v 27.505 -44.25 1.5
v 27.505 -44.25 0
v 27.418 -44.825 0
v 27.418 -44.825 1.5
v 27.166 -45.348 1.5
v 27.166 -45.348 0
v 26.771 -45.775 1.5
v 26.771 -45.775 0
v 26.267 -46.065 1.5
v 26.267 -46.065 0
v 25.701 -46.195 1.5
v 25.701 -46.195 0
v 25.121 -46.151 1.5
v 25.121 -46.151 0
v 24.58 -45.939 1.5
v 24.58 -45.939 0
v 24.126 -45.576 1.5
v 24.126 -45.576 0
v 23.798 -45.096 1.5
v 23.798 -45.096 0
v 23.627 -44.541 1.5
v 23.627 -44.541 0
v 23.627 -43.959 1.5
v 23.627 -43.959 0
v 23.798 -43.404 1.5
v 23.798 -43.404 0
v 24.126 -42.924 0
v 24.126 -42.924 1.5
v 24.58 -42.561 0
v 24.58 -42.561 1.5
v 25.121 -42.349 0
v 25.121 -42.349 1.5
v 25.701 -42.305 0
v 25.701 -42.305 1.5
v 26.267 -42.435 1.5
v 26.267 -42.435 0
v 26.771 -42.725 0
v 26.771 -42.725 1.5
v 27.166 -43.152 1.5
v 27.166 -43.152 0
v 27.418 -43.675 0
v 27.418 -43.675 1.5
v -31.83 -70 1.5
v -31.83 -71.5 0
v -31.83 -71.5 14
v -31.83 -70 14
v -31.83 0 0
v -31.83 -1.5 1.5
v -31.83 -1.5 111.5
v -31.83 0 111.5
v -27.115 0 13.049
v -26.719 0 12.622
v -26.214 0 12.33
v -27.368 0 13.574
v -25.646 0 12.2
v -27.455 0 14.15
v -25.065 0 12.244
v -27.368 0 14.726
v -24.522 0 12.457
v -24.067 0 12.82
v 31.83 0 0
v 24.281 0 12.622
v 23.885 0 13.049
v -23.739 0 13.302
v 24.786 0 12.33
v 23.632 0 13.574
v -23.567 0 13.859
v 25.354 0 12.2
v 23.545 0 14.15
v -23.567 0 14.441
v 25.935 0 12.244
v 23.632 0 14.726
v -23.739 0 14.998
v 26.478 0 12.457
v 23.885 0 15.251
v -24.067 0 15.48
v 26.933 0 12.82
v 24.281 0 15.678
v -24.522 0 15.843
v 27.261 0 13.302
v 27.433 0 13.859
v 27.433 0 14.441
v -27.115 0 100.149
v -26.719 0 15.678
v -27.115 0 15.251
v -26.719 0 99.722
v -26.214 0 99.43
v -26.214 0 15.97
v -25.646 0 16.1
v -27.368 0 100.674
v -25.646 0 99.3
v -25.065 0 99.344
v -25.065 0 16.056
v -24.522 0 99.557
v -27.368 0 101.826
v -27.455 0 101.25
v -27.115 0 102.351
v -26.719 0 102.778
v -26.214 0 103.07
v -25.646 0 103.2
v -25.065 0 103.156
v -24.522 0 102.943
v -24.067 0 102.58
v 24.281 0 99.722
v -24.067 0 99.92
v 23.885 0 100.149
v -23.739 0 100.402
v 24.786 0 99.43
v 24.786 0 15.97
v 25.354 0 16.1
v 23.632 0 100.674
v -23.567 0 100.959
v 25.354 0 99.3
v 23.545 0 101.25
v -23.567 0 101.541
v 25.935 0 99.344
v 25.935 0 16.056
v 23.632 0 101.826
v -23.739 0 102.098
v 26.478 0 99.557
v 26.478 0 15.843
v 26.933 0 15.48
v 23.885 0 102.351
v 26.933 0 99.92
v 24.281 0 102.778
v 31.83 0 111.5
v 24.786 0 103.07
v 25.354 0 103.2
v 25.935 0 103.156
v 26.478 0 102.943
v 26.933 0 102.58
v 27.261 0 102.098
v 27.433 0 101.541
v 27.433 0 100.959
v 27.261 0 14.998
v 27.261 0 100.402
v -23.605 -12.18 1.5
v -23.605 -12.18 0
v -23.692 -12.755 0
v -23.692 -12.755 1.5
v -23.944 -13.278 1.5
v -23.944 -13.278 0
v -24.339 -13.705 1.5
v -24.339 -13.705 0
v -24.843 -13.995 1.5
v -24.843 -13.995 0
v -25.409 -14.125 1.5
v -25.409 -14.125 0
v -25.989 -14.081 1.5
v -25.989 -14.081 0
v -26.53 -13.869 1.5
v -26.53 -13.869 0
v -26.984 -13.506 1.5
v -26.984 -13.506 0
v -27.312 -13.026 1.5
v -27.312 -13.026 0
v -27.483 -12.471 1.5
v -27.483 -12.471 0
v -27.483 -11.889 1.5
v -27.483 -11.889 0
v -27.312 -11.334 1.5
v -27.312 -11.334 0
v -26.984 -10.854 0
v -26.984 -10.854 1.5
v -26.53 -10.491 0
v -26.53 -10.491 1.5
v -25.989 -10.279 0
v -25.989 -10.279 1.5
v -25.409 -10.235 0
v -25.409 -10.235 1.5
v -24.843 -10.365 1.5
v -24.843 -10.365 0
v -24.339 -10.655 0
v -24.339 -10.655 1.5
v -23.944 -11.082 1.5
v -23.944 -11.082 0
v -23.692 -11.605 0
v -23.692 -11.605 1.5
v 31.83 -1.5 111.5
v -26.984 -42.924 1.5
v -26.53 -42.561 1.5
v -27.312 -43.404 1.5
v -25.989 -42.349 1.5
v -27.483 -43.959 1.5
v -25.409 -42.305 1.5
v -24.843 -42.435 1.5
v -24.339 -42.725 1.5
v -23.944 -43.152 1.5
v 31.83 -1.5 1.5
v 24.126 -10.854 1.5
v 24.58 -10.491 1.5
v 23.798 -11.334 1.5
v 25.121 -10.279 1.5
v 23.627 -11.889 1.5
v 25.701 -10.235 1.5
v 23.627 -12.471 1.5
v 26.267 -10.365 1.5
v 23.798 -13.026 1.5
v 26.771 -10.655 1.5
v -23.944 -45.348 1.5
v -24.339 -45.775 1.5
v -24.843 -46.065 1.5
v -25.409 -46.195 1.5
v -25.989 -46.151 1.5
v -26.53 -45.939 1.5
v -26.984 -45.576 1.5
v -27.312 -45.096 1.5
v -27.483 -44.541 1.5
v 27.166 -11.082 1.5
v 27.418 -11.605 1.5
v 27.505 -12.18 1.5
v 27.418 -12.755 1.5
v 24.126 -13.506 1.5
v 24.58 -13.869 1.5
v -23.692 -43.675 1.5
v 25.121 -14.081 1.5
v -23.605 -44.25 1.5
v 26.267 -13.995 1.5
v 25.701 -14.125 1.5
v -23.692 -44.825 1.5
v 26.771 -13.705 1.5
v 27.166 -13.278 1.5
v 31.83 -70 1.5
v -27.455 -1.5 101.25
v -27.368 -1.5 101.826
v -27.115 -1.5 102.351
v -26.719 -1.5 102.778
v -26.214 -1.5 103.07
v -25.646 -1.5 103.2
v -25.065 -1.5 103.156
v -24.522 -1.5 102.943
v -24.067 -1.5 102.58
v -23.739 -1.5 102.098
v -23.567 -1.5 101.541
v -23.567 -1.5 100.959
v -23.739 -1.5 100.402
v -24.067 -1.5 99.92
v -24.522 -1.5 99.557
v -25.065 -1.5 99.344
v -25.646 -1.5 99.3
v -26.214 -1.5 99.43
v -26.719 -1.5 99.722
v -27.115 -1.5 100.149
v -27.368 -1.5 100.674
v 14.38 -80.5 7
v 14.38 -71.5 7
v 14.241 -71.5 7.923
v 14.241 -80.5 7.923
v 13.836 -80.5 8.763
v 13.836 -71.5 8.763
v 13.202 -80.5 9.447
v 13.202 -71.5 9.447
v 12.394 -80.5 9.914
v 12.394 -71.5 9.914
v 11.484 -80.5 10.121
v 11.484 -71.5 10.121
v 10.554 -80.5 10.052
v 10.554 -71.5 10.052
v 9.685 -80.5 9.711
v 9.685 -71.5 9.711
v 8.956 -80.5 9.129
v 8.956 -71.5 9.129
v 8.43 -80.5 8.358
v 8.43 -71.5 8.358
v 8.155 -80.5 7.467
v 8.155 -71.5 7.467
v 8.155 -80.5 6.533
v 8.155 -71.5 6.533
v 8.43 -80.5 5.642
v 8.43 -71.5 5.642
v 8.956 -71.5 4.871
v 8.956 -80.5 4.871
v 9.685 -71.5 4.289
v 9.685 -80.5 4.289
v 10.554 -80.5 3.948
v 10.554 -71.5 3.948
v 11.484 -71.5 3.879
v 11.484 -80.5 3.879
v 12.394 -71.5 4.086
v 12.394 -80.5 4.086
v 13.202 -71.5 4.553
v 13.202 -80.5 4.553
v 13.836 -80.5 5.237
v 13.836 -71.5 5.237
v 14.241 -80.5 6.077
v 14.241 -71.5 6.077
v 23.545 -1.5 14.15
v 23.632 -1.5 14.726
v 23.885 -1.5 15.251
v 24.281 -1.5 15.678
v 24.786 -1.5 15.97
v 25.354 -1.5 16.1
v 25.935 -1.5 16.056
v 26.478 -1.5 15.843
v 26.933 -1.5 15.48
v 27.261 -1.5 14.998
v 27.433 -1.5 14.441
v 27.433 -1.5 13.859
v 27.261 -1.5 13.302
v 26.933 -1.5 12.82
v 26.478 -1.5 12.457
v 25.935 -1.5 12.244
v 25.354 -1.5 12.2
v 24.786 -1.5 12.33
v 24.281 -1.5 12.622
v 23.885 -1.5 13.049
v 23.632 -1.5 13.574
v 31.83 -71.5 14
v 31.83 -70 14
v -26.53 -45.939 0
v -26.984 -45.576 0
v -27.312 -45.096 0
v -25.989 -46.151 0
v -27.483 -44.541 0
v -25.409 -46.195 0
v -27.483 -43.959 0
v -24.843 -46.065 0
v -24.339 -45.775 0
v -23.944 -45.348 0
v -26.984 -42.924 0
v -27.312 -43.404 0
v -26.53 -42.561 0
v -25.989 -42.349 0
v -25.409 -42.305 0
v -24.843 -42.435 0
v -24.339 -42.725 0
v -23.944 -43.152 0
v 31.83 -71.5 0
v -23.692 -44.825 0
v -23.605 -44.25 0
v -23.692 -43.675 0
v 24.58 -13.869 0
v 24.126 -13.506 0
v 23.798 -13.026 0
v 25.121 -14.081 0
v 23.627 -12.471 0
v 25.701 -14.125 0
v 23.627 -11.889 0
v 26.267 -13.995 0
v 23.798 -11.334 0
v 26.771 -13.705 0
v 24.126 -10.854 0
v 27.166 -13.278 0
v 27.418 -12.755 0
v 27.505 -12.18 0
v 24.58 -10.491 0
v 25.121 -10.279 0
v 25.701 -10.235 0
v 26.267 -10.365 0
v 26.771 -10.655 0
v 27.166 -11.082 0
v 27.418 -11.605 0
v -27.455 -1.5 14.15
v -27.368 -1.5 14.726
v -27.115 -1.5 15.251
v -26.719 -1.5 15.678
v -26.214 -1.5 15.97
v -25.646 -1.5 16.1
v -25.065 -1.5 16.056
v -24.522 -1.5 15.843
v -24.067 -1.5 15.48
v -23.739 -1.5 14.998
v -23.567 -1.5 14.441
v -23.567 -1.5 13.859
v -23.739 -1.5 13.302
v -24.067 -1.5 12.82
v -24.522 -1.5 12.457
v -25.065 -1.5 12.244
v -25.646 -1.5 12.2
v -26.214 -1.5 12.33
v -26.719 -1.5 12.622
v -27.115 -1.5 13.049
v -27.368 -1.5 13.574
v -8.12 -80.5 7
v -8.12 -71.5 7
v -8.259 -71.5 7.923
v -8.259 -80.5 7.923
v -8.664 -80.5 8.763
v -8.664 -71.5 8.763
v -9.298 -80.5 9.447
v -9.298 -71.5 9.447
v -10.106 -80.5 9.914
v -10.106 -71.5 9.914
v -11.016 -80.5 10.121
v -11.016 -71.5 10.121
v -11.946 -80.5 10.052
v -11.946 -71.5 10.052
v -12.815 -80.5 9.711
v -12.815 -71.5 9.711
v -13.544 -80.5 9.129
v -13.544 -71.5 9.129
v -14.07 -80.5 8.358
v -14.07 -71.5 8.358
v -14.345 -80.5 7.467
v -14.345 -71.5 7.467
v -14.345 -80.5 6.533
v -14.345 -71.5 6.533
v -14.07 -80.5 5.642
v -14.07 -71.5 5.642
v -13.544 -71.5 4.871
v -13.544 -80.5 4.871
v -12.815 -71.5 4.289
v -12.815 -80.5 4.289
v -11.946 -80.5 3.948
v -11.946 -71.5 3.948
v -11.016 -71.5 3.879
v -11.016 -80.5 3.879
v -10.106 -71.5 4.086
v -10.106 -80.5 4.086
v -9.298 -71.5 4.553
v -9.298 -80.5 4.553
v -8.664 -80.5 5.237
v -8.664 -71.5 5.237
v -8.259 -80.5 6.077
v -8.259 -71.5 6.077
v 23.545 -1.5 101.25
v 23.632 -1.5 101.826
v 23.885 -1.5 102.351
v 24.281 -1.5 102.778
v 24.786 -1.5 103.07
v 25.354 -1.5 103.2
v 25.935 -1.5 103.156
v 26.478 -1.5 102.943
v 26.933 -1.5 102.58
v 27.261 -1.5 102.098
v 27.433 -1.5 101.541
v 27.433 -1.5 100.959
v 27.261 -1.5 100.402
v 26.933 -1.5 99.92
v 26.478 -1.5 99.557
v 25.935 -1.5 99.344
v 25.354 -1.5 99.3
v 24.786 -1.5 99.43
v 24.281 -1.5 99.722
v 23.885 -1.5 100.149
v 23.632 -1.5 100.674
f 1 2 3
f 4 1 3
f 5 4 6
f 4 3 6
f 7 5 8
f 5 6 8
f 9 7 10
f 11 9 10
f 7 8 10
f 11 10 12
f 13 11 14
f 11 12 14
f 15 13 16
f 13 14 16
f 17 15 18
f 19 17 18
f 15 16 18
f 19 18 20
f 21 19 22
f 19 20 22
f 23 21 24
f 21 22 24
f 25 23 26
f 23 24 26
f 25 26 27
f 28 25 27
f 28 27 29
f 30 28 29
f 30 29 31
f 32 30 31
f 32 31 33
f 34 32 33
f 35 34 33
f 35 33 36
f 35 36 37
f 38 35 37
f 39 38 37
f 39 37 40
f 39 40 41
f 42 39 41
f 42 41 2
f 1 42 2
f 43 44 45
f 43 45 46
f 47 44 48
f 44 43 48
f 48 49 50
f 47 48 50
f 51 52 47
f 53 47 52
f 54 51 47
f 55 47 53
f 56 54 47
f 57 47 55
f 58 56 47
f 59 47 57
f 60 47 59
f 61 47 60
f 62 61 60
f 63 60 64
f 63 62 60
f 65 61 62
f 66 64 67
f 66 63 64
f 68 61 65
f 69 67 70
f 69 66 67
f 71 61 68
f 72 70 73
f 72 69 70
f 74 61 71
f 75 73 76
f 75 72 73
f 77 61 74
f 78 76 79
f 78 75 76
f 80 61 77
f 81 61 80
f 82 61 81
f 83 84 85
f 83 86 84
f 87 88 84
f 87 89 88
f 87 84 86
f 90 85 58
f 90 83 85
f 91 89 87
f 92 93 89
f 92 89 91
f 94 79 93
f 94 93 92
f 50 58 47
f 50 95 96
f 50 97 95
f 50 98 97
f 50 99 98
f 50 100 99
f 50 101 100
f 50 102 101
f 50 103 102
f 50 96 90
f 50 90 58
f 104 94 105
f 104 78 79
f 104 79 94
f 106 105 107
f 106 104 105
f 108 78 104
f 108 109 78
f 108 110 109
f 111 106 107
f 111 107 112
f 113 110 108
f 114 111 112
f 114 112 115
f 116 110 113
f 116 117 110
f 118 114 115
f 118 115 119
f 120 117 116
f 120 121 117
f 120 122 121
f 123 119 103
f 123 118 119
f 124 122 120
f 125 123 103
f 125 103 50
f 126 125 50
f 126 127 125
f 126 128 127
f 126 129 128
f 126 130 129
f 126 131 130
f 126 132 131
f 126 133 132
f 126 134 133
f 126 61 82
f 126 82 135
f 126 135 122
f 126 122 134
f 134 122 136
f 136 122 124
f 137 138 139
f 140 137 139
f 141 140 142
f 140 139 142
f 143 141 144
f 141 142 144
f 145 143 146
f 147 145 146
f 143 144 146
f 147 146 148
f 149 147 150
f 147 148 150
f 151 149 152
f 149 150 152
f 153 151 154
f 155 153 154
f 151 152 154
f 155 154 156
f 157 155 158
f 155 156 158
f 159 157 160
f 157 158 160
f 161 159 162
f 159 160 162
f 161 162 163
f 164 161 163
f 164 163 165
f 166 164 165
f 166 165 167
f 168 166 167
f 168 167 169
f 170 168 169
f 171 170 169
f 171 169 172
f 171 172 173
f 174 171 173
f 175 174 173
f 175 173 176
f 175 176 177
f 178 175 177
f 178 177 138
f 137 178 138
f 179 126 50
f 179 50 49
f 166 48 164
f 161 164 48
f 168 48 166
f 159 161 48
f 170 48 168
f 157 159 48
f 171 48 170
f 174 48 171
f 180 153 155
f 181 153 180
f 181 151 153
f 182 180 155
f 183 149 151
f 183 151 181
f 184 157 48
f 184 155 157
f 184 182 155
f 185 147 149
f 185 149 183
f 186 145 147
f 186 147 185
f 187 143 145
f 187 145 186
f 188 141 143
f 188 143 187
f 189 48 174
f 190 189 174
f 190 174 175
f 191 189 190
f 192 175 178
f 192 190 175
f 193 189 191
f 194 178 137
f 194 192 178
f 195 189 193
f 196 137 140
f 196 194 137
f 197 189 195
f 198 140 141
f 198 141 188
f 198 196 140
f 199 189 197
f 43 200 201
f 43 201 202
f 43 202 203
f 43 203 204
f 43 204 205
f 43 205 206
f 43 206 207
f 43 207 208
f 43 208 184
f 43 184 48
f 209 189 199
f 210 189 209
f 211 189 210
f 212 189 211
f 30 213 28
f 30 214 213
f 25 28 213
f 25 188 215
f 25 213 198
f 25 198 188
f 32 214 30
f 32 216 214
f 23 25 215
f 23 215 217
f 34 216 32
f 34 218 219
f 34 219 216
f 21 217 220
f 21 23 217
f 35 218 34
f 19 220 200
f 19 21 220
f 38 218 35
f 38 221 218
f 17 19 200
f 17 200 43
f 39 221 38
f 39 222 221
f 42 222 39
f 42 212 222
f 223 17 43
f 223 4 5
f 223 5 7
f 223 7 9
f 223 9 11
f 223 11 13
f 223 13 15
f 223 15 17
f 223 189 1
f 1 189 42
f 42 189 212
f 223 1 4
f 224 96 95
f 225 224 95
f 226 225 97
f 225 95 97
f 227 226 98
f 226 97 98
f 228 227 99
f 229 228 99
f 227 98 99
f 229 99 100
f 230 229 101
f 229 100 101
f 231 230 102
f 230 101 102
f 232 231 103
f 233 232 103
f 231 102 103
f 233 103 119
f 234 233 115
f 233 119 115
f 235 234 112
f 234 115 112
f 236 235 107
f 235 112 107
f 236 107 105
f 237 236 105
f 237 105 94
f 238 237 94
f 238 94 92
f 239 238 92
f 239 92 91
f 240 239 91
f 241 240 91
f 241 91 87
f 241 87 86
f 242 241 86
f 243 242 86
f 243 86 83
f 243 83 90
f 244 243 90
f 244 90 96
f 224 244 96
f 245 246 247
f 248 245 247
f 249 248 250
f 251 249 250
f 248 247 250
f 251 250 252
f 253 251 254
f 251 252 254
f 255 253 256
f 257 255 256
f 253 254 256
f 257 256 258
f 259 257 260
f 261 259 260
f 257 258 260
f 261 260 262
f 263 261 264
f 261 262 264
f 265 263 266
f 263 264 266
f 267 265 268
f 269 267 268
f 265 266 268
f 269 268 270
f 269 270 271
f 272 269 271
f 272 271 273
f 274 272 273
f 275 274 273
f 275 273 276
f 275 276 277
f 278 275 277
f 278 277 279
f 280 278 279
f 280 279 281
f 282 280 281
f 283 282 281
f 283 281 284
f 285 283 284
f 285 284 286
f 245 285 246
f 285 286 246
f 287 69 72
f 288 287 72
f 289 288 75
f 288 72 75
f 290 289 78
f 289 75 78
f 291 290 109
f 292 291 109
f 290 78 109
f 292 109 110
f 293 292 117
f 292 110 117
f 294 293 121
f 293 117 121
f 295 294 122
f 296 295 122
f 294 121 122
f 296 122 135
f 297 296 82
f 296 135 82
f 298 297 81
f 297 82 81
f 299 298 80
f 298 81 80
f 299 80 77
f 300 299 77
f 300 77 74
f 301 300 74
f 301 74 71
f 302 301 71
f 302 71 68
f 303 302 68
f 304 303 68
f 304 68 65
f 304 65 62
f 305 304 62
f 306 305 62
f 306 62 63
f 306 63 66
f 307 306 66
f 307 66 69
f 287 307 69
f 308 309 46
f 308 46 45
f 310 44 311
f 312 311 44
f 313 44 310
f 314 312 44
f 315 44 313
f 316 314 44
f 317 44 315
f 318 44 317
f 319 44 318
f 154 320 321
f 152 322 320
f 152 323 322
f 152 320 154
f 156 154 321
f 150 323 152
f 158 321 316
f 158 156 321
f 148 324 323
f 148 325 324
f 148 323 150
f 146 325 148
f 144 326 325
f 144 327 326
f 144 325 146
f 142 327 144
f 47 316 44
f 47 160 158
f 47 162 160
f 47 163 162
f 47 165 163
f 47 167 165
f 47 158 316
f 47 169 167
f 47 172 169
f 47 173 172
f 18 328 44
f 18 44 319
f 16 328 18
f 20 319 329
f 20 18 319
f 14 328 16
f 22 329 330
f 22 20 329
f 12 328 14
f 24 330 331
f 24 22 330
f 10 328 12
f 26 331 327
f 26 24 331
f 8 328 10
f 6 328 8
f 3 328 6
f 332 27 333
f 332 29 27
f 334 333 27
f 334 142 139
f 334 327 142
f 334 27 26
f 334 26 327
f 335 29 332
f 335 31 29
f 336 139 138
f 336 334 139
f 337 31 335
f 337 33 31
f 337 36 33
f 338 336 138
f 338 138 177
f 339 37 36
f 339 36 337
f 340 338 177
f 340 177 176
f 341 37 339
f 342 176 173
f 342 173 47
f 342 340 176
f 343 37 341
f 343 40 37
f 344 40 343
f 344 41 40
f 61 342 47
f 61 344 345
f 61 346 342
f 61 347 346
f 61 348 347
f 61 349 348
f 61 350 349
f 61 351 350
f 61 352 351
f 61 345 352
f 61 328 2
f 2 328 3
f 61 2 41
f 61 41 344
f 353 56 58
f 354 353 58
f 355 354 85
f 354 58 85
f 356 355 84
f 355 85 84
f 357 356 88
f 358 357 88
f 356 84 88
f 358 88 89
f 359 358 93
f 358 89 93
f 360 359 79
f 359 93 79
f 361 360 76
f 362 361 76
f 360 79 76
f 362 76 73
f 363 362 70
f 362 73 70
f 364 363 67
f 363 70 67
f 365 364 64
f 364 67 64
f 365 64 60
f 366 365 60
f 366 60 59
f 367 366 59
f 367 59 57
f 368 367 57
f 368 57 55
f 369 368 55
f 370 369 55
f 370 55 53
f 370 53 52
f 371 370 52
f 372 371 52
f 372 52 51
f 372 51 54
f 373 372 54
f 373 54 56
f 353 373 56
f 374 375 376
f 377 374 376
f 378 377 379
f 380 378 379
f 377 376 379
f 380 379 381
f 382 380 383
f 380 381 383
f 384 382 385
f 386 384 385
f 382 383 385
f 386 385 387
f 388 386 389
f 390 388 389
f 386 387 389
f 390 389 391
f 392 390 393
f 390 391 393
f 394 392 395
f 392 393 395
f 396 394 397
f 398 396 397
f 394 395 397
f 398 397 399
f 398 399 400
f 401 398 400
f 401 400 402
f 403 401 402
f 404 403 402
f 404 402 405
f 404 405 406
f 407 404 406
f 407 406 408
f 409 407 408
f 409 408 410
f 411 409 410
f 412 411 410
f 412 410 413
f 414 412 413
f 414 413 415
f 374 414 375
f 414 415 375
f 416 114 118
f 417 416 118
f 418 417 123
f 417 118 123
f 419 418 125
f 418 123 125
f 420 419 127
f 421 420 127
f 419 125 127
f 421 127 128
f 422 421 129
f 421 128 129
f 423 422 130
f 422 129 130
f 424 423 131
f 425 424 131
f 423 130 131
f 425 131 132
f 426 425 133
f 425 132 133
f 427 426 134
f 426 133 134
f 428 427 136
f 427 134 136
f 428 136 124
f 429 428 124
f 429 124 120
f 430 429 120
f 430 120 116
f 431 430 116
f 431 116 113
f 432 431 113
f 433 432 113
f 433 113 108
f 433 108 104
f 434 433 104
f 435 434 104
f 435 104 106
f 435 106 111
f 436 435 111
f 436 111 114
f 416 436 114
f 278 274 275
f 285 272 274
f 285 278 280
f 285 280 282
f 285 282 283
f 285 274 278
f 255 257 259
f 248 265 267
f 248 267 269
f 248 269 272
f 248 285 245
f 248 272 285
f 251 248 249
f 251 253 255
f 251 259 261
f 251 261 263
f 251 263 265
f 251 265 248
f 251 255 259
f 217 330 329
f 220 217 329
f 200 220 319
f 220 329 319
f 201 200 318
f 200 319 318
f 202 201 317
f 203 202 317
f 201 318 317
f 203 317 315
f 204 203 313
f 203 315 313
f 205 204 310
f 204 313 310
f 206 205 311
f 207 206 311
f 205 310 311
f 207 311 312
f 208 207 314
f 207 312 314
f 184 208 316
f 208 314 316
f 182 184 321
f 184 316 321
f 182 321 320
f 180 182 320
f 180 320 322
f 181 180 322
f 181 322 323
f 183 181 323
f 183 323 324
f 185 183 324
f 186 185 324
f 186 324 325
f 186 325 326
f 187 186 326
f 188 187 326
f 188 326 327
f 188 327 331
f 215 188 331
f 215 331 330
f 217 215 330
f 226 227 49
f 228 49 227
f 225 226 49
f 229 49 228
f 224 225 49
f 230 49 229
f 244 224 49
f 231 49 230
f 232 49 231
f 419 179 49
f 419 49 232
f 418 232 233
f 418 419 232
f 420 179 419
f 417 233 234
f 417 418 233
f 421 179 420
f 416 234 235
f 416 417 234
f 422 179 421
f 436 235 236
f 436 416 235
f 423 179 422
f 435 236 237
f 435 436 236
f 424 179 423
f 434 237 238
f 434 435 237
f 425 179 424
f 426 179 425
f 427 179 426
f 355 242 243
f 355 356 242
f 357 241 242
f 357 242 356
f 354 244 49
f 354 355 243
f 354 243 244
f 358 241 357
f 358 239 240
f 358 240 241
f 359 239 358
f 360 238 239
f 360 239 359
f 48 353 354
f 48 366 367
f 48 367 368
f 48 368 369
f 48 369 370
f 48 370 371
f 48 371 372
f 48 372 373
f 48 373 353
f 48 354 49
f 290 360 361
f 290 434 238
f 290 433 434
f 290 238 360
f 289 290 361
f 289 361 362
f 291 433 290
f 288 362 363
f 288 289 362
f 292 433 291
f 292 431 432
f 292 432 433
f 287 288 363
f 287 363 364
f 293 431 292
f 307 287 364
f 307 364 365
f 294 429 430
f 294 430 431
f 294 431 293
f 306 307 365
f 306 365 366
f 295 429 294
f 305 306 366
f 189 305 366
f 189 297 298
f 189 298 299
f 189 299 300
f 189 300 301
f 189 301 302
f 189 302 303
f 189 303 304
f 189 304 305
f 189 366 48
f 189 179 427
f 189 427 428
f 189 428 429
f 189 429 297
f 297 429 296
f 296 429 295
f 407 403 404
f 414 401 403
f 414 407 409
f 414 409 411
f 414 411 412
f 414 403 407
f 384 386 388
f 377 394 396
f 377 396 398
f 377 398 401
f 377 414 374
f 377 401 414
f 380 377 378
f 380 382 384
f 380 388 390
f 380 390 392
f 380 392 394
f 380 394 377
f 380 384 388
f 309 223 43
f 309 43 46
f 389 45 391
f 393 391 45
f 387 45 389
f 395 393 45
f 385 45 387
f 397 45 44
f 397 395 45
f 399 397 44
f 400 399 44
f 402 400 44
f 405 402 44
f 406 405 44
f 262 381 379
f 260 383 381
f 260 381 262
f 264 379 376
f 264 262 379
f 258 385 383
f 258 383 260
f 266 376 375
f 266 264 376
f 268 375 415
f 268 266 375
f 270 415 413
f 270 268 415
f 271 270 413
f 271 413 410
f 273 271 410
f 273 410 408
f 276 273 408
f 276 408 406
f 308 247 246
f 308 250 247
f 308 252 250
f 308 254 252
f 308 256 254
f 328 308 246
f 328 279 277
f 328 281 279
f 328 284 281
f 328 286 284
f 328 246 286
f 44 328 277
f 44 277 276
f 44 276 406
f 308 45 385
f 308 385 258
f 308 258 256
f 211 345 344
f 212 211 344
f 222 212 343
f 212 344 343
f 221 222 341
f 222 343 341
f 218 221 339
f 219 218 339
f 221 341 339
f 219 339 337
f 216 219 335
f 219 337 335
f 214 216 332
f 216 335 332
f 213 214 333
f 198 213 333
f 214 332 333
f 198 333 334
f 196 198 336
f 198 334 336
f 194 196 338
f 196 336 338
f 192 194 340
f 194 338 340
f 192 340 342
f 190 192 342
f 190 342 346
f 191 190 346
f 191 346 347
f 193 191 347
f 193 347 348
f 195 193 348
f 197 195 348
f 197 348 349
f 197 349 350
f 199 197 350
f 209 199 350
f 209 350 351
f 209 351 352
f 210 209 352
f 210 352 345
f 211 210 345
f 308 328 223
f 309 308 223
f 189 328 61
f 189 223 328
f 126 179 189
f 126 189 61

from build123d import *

# Parameters (mm, degrees)
F1_DEPTH      = 31.83
F1_DEPTH_BACK = 31.83
F2_R          = 1.955
F3_DEPTH      = 25
F4_R          = 3.13
F5_DEPTH      = 9
F6_R          = 1.95
F7_DEPTH      = 25


with BuildPart() as f1:
    # F0 (on Right) → F1 (new body, two sides)
    with BuildSketch(Plane.YZ) as f1_sk:
        Polygon((0, 0), (0, 111.5), (-1.5, 111.5), (-1.5, 1.5), (-70, 1.5), (-70, 14), (-71.5, 14), (-71.5, 0), align=None)
    extrude(amount=F1_DEPTH)
    extrude(f1_sk.sketch, amount=-F1_DEPTH_BACK)

    # F2 (on face) → F3 (cut)
    with BuildSketch(Plane(origin=(0, 0, 0), x_dir=(-1, 0, 0), z_dir=(0, 1, 0))):
        with Locations((-25.5, 101.25)):
            Circle(F2_R)
        with Locations((25.5, 101.25)):
            Circle(F2_R)
        with Locations((25.5, 14.15)):
            Circle(F2_R)
        with Locations((-25.5, 14.15)):
            Circle(F2_R)
    extrude(amount=-F3_DEPTH, mode=Mode.SUBTRACT)

    # F4 (on face) → F5 (join)
    with BuildSketch(Plane.XZ.offset(71.5)):
        with Locations((-11.25, 7)):
            Circle(F4_R)
        with Locations((11.25, 7)):
            Circle(F4_R)
    extrude(amount=F5_DEPTH)

    # F6 (on face) → F7 (cut)
    with BuildSketch(Plane(origin=(0, 0, 0), x_dir=(1, 0, 0), z_dir=(0, 0, -1))):
        with Locations((-25.555, 44.25)):
            Circle(F6_R)
        with Locations((25.555, 44.25)):
            Circle(F6_R)
        with Locations((25.555, 12.18)):
            Circle(F6_R)
        with Locations((-25.555, 12.18)):
            Circle(F6_R)
    extrude(amount=-F7_DEPTH, mode=Mode.SUBTRACT)


solid = f1.part
